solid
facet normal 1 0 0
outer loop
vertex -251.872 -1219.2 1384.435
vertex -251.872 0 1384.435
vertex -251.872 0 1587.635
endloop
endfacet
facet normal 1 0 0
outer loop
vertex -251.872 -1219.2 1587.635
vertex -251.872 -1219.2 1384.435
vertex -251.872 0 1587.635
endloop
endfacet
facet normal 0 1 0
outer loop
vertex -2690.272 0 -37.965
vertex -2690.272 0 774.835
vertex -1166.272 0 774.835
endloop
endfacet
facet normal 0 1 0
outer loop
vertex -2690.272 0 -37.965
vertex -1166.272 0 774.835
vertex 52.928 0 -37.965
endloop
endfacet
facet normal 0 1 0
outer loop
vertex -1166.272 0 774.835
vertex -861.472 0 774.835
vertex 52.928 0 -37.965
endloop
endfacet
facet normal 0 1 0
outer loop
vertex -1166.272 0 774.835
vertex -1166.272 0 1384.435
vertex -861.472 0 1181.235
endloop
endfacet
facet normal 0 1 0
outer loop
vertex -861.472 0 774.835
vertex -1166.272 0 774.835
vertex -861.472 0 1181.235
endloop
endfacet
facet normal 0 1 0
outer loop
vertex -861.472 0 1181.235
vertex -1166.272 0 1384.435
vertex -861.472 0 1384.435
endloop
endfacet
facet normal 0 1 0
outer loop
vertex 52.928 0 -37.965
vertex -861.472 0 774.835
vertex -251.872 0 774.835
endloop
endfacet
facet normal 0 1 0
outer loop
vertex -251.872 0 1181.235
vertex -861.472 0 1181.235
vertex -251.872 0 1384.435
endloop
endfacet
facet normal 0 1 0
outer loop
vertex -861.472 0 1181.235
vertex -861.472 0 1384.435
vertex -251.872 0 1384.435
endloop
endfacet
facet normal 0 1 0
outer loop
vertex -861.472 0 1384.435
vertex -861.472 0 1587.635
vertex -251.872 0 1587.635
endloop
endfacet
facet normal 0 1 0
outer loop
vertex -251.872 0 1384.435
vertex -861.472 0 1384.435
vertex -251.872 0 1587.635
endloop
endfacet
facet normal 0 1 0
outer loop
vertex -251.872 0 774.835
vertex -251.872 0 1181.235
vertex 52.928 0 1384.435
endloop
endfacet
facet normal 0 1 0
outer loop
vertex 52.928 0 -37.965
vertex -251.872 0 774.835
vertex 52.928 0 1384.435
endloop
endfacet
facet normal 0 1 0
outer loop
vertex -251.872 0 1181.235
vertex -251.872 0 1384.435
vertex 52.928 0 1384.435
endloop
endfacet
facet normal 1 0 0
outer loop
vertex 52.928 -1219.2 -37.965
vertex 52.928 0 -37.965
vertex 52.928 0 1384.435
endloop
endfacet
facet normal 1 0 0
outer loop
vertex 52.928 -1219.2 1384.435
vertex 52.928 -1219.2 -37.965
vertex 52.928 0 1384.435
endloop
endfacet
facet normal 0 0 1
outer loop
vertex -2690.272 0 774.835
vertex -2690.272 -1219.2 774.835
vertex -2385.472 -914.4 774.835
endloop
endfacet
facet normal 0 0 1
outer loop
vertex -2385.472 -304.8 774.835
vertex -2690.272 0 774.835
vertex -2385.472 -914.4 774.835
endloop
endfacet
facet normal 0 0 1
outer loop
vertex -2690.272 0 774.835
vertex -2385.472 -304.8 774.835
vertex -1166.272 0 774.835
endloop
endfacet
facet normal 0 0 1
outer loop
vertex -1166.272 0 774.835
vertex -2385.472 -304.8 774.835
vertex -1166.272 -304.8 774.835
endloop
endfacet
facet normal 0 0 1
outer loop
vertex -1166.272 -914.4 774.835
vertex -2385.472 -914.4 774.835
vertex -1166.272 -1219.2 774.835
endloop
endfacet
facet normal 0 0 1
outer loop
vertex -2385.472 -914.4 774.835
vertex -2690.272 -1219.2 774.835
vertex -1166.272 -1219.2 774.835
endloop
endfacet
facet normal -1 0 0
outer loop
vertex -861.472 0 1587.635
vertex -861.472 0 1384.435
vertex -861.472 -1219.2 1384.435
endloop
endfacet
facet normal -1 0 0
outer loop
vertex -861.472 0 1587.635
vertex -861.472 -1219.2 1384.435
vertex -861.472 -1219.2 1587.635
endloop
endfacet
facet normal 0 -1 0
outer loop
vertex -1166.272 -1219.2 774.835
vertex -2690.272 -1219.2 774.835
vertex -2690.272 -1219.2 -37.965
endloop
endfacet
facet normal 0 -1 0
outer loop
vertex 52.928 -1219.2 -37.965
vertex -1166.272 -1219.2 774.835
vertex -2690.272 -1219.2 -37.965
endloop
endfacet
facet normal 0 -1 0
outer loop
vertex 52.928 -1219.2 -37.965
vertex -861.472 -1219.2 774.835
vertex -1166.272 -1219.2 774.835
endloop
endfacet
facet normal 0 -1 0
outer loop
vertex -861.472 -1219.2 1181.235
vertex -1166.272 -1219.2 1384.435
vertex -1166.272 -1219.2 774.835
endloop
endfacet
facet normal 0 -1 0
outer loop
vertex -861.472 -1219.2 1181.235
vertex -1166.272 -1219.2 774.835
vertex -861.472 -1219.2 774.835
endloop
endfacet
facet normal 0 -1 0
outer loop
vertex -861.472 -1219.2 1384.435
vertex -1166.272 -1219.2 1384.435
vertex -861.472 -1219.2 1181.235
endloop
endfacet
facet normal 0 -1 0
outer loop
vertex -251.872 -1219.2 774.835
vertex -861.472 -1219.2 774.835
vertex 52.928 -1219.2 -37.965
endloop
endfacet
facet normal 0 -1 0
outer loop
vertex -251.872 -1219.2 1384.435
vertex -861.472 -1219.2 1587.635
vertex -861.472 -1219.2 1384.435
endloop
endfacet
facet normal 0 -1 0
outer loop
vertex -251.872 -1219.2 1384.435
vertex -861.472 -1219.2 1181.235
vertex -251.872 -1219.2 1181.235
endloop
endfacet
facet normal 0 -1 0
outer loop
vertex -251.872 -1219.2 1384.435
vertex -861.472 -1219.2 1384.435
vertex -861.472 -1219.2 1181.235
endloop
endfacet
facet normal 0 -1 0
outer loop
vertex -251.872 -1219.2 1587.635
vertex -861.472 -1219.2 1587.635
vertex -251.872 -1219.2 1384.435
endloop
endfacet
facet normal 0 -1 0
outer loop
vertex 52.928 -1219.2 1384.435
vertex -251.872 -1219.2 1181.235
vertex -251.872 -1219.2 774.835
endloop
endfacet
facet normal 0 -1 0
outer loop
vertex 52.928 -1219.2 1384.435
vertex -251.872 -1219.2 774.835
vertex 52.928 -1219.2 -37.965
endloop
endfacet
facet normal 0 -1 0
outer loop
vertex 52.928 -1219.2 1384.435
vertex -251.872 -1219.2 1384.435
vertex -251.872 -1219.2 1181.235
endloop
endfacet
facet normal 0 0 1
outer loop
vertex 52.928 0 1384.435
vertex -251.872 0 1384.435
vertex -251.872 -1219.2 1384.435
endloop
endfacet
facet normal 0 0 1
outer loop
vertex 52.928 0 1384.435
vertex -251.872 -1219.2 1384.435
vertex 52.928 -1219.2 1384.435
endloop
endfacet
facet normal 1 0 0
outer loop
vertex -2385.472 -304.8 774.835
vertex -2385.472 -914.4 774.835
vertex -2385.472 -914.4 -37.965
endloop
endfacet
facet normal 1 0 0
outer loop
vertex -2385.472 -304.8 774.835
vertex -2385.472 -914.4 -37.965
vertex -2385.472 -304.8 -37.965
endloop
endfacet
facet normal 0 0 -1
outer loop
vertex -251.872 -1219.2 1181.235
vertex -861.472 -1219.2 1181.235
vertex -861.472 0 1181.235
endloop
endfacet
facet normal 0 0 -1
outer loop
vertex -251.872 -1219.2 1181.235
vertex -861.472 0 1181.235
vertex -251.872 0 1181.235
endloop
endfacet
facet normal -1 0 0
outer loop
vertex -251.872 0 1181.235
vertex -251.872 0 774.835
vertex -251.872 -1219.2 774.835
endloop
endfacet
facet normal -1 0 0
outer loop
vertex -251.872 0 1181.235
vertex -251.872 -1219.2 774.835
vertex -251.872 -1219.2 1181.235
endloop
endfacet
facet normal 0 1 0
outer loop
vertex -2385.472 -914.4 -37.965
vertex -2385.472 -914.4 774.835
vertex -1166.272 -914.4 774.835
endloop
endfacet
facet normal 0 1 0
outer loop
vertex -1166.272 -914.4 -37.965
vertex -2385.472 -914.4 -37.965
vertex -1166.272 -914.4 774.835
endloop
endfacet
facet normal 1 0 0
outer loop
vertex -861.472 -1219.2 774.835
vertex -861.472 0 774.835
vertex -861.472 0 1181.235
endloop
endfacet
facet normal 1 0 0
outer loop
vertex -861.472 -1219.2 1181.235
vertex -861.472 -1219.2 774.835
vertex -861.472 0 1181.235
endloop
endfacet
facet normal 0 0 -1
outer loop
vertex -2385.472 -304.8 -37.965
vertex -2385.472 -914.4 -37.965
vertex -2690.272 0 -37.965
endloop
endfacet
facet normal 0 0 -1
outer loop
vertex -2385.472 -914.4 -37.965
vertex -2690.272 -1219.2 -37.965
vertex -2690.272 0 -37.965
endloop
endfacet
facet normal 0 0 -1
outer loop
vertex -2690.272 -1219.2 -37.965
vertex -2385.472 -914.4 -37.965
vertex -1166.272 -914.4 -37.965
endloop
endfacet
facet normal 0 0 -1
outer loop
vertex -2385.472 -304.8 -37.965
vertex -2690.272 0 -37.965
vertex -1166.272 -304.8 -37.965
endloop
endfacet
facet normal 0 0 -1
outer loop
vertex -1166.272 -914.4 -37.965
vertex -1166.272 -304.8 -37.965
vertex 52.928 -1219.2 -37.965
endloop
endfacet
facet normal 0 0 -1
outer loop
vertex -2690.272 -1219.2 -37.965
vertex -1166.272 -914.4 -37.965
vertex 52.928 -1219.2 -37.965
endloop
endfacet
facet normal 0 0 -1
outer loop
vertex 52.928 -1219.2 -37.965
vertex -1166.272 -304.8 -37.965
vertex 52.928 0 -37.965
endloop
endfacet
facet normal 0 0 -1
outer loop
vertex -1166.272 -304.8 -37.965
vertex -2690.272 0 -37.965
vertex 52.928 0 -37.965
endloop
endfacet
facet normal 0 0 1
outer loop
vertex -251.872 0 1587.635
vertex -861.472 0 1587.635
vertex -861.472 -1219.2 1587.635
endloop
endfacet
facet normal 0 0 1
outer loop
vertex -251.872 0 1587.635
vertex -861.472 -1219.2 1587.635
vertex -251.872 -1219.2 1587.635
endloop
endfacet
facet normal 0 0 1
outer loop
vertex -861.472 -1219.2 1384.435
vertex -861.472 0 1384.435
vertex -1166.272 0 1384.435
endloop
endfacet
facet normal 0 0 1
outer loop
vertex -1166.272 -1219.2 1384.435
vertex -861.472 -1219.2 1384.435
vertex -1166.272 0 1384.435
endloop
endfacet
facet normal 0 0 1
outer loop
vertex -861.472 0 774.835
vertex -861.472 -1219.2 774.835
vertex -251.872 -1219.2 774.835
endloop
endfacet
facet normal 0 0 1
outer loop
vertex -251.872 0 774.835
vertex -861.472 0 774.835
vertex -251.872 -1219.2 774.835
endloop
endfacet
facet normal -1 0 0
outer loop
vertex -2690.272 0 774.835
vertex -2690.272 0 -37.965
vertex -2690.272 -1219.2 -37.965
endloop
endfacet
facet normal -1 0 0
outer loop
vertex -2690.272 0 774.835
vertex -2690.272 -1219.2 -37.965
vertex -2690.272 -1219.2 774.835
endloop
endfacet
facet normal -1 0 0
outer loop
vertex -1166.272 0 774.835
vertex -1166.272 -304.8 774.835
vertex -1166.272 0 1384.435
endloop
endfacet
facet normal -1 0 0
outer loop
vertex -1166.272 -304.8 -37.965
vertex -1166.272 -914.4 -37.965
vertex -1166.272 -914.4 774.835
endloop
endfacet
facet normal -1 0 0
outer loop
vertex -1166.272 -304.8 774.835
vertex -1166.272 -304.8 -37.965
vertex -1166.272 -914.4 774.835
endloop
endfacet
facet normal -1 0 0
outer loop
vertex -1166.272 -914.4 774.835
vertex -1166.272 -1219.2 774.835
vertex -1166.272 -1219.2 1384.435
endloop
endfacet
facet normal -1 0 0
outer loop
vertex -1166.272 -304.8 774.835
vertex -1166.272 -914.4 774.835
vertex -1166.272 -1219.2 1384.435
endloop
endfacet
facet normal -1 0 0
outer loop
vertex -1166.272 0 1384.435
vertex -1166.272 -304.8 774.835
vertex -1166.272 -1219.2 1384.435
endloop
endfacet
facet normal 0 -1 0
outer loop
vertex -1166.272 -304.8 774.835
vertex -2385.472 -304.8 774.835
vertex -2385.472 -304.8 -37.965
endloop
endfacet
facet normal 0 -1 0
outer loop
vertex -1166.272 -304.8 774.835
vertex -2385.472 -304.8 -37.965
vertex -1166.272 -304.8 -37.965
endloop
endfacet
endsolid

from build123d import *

# Parameters (mm, degrees)
F0_W      = 2743.2
F0_H      = 1625.6
F1_DEPTH  = 1219.2
F2_W      = 304.8
F2_H      = 203.2
F3_DEPTH  = 1219.201
F5_DEPTH  = 1219.201
F9_W      = 609.6
F9_H      = 406.4
F10_DEPTH = 1219.201
F11_W     = 1219.2
F11_H     = 609.6
F12_DEPTH = 812.801


# Not quite as in the source:
# - a feature of the source that left no trace in its solid (it failed there, or was rolled back) is left out
# - a pattern or mirror of a feature is missing from the dataset's text; its kind, count and spacing are read off the source's solid


with BuildPart() as f1:
    # F0 (on Front) → F1 (new body)
    with BuildSketch(Plane.XZ):
        with Locations((-1318.6722079277, 774.8354399085)):
            Rectangle(F0_W, F0_H)
    extrude(amount=F1_DEPTH)

    # F2 (on face) → F3 (cut, through all)
    with BuildSketch(Plane.XZ.offset(1219.2)):
        with Locations((-99.4722079277, 1486.0354399085)):
            Rectangle(F2_W, F2_H)
    f3 = extrude(amount=-F3_DEPTH, mode=Mode.SUBTRACT)

    # F3_copies: F3 across plane
    add(f3.mirror(Plane(origin=(-556.672208, 0, 0), x_dir=(0, 0, -1), z_dir=(-1, 0, 0))), mode=Mode.SUBTRACT)

    # F4 (on face) → F5 (cut, through all)
    with BuildSketch(Plane.XZ.offset(1219.2)):
        Polygon((-1166.2722079277, 1587.6354399085), (-2690.2722079277, 1587.6354399085), (-2690.2722079277, 774.8354399085), (-1166.2722079277, 774.8354399085), (-1166.2722079277, 1384.4354399085), align=None)
    extrude(amount=-F5_DEPTH, mode=Mode.SUBTRACT)

    # F9 (on face) → F10 (cut, through all)
    with BuildSketch(Plane.XZ.offset(1219.2)):
        with Locations((-556.6722079277, 978.0354399085)):
            Rectangle(F9_W, F9_H)
    extrude(amount=-F10_DEPTH, mode=Mode.SUBTRACT)

    # F11 (on face) → F12 (cut, through all)
    with BuildSketch(Plane.XY.offset(774.8354399085)):
        with Locations((-1775.8722079277, -609.6)):
            Rectangle(F11_W, F11_H)
    extrude(amount=-F12_DEPTH, mode=Mode.SUBTRACT)


solid = f1.part
